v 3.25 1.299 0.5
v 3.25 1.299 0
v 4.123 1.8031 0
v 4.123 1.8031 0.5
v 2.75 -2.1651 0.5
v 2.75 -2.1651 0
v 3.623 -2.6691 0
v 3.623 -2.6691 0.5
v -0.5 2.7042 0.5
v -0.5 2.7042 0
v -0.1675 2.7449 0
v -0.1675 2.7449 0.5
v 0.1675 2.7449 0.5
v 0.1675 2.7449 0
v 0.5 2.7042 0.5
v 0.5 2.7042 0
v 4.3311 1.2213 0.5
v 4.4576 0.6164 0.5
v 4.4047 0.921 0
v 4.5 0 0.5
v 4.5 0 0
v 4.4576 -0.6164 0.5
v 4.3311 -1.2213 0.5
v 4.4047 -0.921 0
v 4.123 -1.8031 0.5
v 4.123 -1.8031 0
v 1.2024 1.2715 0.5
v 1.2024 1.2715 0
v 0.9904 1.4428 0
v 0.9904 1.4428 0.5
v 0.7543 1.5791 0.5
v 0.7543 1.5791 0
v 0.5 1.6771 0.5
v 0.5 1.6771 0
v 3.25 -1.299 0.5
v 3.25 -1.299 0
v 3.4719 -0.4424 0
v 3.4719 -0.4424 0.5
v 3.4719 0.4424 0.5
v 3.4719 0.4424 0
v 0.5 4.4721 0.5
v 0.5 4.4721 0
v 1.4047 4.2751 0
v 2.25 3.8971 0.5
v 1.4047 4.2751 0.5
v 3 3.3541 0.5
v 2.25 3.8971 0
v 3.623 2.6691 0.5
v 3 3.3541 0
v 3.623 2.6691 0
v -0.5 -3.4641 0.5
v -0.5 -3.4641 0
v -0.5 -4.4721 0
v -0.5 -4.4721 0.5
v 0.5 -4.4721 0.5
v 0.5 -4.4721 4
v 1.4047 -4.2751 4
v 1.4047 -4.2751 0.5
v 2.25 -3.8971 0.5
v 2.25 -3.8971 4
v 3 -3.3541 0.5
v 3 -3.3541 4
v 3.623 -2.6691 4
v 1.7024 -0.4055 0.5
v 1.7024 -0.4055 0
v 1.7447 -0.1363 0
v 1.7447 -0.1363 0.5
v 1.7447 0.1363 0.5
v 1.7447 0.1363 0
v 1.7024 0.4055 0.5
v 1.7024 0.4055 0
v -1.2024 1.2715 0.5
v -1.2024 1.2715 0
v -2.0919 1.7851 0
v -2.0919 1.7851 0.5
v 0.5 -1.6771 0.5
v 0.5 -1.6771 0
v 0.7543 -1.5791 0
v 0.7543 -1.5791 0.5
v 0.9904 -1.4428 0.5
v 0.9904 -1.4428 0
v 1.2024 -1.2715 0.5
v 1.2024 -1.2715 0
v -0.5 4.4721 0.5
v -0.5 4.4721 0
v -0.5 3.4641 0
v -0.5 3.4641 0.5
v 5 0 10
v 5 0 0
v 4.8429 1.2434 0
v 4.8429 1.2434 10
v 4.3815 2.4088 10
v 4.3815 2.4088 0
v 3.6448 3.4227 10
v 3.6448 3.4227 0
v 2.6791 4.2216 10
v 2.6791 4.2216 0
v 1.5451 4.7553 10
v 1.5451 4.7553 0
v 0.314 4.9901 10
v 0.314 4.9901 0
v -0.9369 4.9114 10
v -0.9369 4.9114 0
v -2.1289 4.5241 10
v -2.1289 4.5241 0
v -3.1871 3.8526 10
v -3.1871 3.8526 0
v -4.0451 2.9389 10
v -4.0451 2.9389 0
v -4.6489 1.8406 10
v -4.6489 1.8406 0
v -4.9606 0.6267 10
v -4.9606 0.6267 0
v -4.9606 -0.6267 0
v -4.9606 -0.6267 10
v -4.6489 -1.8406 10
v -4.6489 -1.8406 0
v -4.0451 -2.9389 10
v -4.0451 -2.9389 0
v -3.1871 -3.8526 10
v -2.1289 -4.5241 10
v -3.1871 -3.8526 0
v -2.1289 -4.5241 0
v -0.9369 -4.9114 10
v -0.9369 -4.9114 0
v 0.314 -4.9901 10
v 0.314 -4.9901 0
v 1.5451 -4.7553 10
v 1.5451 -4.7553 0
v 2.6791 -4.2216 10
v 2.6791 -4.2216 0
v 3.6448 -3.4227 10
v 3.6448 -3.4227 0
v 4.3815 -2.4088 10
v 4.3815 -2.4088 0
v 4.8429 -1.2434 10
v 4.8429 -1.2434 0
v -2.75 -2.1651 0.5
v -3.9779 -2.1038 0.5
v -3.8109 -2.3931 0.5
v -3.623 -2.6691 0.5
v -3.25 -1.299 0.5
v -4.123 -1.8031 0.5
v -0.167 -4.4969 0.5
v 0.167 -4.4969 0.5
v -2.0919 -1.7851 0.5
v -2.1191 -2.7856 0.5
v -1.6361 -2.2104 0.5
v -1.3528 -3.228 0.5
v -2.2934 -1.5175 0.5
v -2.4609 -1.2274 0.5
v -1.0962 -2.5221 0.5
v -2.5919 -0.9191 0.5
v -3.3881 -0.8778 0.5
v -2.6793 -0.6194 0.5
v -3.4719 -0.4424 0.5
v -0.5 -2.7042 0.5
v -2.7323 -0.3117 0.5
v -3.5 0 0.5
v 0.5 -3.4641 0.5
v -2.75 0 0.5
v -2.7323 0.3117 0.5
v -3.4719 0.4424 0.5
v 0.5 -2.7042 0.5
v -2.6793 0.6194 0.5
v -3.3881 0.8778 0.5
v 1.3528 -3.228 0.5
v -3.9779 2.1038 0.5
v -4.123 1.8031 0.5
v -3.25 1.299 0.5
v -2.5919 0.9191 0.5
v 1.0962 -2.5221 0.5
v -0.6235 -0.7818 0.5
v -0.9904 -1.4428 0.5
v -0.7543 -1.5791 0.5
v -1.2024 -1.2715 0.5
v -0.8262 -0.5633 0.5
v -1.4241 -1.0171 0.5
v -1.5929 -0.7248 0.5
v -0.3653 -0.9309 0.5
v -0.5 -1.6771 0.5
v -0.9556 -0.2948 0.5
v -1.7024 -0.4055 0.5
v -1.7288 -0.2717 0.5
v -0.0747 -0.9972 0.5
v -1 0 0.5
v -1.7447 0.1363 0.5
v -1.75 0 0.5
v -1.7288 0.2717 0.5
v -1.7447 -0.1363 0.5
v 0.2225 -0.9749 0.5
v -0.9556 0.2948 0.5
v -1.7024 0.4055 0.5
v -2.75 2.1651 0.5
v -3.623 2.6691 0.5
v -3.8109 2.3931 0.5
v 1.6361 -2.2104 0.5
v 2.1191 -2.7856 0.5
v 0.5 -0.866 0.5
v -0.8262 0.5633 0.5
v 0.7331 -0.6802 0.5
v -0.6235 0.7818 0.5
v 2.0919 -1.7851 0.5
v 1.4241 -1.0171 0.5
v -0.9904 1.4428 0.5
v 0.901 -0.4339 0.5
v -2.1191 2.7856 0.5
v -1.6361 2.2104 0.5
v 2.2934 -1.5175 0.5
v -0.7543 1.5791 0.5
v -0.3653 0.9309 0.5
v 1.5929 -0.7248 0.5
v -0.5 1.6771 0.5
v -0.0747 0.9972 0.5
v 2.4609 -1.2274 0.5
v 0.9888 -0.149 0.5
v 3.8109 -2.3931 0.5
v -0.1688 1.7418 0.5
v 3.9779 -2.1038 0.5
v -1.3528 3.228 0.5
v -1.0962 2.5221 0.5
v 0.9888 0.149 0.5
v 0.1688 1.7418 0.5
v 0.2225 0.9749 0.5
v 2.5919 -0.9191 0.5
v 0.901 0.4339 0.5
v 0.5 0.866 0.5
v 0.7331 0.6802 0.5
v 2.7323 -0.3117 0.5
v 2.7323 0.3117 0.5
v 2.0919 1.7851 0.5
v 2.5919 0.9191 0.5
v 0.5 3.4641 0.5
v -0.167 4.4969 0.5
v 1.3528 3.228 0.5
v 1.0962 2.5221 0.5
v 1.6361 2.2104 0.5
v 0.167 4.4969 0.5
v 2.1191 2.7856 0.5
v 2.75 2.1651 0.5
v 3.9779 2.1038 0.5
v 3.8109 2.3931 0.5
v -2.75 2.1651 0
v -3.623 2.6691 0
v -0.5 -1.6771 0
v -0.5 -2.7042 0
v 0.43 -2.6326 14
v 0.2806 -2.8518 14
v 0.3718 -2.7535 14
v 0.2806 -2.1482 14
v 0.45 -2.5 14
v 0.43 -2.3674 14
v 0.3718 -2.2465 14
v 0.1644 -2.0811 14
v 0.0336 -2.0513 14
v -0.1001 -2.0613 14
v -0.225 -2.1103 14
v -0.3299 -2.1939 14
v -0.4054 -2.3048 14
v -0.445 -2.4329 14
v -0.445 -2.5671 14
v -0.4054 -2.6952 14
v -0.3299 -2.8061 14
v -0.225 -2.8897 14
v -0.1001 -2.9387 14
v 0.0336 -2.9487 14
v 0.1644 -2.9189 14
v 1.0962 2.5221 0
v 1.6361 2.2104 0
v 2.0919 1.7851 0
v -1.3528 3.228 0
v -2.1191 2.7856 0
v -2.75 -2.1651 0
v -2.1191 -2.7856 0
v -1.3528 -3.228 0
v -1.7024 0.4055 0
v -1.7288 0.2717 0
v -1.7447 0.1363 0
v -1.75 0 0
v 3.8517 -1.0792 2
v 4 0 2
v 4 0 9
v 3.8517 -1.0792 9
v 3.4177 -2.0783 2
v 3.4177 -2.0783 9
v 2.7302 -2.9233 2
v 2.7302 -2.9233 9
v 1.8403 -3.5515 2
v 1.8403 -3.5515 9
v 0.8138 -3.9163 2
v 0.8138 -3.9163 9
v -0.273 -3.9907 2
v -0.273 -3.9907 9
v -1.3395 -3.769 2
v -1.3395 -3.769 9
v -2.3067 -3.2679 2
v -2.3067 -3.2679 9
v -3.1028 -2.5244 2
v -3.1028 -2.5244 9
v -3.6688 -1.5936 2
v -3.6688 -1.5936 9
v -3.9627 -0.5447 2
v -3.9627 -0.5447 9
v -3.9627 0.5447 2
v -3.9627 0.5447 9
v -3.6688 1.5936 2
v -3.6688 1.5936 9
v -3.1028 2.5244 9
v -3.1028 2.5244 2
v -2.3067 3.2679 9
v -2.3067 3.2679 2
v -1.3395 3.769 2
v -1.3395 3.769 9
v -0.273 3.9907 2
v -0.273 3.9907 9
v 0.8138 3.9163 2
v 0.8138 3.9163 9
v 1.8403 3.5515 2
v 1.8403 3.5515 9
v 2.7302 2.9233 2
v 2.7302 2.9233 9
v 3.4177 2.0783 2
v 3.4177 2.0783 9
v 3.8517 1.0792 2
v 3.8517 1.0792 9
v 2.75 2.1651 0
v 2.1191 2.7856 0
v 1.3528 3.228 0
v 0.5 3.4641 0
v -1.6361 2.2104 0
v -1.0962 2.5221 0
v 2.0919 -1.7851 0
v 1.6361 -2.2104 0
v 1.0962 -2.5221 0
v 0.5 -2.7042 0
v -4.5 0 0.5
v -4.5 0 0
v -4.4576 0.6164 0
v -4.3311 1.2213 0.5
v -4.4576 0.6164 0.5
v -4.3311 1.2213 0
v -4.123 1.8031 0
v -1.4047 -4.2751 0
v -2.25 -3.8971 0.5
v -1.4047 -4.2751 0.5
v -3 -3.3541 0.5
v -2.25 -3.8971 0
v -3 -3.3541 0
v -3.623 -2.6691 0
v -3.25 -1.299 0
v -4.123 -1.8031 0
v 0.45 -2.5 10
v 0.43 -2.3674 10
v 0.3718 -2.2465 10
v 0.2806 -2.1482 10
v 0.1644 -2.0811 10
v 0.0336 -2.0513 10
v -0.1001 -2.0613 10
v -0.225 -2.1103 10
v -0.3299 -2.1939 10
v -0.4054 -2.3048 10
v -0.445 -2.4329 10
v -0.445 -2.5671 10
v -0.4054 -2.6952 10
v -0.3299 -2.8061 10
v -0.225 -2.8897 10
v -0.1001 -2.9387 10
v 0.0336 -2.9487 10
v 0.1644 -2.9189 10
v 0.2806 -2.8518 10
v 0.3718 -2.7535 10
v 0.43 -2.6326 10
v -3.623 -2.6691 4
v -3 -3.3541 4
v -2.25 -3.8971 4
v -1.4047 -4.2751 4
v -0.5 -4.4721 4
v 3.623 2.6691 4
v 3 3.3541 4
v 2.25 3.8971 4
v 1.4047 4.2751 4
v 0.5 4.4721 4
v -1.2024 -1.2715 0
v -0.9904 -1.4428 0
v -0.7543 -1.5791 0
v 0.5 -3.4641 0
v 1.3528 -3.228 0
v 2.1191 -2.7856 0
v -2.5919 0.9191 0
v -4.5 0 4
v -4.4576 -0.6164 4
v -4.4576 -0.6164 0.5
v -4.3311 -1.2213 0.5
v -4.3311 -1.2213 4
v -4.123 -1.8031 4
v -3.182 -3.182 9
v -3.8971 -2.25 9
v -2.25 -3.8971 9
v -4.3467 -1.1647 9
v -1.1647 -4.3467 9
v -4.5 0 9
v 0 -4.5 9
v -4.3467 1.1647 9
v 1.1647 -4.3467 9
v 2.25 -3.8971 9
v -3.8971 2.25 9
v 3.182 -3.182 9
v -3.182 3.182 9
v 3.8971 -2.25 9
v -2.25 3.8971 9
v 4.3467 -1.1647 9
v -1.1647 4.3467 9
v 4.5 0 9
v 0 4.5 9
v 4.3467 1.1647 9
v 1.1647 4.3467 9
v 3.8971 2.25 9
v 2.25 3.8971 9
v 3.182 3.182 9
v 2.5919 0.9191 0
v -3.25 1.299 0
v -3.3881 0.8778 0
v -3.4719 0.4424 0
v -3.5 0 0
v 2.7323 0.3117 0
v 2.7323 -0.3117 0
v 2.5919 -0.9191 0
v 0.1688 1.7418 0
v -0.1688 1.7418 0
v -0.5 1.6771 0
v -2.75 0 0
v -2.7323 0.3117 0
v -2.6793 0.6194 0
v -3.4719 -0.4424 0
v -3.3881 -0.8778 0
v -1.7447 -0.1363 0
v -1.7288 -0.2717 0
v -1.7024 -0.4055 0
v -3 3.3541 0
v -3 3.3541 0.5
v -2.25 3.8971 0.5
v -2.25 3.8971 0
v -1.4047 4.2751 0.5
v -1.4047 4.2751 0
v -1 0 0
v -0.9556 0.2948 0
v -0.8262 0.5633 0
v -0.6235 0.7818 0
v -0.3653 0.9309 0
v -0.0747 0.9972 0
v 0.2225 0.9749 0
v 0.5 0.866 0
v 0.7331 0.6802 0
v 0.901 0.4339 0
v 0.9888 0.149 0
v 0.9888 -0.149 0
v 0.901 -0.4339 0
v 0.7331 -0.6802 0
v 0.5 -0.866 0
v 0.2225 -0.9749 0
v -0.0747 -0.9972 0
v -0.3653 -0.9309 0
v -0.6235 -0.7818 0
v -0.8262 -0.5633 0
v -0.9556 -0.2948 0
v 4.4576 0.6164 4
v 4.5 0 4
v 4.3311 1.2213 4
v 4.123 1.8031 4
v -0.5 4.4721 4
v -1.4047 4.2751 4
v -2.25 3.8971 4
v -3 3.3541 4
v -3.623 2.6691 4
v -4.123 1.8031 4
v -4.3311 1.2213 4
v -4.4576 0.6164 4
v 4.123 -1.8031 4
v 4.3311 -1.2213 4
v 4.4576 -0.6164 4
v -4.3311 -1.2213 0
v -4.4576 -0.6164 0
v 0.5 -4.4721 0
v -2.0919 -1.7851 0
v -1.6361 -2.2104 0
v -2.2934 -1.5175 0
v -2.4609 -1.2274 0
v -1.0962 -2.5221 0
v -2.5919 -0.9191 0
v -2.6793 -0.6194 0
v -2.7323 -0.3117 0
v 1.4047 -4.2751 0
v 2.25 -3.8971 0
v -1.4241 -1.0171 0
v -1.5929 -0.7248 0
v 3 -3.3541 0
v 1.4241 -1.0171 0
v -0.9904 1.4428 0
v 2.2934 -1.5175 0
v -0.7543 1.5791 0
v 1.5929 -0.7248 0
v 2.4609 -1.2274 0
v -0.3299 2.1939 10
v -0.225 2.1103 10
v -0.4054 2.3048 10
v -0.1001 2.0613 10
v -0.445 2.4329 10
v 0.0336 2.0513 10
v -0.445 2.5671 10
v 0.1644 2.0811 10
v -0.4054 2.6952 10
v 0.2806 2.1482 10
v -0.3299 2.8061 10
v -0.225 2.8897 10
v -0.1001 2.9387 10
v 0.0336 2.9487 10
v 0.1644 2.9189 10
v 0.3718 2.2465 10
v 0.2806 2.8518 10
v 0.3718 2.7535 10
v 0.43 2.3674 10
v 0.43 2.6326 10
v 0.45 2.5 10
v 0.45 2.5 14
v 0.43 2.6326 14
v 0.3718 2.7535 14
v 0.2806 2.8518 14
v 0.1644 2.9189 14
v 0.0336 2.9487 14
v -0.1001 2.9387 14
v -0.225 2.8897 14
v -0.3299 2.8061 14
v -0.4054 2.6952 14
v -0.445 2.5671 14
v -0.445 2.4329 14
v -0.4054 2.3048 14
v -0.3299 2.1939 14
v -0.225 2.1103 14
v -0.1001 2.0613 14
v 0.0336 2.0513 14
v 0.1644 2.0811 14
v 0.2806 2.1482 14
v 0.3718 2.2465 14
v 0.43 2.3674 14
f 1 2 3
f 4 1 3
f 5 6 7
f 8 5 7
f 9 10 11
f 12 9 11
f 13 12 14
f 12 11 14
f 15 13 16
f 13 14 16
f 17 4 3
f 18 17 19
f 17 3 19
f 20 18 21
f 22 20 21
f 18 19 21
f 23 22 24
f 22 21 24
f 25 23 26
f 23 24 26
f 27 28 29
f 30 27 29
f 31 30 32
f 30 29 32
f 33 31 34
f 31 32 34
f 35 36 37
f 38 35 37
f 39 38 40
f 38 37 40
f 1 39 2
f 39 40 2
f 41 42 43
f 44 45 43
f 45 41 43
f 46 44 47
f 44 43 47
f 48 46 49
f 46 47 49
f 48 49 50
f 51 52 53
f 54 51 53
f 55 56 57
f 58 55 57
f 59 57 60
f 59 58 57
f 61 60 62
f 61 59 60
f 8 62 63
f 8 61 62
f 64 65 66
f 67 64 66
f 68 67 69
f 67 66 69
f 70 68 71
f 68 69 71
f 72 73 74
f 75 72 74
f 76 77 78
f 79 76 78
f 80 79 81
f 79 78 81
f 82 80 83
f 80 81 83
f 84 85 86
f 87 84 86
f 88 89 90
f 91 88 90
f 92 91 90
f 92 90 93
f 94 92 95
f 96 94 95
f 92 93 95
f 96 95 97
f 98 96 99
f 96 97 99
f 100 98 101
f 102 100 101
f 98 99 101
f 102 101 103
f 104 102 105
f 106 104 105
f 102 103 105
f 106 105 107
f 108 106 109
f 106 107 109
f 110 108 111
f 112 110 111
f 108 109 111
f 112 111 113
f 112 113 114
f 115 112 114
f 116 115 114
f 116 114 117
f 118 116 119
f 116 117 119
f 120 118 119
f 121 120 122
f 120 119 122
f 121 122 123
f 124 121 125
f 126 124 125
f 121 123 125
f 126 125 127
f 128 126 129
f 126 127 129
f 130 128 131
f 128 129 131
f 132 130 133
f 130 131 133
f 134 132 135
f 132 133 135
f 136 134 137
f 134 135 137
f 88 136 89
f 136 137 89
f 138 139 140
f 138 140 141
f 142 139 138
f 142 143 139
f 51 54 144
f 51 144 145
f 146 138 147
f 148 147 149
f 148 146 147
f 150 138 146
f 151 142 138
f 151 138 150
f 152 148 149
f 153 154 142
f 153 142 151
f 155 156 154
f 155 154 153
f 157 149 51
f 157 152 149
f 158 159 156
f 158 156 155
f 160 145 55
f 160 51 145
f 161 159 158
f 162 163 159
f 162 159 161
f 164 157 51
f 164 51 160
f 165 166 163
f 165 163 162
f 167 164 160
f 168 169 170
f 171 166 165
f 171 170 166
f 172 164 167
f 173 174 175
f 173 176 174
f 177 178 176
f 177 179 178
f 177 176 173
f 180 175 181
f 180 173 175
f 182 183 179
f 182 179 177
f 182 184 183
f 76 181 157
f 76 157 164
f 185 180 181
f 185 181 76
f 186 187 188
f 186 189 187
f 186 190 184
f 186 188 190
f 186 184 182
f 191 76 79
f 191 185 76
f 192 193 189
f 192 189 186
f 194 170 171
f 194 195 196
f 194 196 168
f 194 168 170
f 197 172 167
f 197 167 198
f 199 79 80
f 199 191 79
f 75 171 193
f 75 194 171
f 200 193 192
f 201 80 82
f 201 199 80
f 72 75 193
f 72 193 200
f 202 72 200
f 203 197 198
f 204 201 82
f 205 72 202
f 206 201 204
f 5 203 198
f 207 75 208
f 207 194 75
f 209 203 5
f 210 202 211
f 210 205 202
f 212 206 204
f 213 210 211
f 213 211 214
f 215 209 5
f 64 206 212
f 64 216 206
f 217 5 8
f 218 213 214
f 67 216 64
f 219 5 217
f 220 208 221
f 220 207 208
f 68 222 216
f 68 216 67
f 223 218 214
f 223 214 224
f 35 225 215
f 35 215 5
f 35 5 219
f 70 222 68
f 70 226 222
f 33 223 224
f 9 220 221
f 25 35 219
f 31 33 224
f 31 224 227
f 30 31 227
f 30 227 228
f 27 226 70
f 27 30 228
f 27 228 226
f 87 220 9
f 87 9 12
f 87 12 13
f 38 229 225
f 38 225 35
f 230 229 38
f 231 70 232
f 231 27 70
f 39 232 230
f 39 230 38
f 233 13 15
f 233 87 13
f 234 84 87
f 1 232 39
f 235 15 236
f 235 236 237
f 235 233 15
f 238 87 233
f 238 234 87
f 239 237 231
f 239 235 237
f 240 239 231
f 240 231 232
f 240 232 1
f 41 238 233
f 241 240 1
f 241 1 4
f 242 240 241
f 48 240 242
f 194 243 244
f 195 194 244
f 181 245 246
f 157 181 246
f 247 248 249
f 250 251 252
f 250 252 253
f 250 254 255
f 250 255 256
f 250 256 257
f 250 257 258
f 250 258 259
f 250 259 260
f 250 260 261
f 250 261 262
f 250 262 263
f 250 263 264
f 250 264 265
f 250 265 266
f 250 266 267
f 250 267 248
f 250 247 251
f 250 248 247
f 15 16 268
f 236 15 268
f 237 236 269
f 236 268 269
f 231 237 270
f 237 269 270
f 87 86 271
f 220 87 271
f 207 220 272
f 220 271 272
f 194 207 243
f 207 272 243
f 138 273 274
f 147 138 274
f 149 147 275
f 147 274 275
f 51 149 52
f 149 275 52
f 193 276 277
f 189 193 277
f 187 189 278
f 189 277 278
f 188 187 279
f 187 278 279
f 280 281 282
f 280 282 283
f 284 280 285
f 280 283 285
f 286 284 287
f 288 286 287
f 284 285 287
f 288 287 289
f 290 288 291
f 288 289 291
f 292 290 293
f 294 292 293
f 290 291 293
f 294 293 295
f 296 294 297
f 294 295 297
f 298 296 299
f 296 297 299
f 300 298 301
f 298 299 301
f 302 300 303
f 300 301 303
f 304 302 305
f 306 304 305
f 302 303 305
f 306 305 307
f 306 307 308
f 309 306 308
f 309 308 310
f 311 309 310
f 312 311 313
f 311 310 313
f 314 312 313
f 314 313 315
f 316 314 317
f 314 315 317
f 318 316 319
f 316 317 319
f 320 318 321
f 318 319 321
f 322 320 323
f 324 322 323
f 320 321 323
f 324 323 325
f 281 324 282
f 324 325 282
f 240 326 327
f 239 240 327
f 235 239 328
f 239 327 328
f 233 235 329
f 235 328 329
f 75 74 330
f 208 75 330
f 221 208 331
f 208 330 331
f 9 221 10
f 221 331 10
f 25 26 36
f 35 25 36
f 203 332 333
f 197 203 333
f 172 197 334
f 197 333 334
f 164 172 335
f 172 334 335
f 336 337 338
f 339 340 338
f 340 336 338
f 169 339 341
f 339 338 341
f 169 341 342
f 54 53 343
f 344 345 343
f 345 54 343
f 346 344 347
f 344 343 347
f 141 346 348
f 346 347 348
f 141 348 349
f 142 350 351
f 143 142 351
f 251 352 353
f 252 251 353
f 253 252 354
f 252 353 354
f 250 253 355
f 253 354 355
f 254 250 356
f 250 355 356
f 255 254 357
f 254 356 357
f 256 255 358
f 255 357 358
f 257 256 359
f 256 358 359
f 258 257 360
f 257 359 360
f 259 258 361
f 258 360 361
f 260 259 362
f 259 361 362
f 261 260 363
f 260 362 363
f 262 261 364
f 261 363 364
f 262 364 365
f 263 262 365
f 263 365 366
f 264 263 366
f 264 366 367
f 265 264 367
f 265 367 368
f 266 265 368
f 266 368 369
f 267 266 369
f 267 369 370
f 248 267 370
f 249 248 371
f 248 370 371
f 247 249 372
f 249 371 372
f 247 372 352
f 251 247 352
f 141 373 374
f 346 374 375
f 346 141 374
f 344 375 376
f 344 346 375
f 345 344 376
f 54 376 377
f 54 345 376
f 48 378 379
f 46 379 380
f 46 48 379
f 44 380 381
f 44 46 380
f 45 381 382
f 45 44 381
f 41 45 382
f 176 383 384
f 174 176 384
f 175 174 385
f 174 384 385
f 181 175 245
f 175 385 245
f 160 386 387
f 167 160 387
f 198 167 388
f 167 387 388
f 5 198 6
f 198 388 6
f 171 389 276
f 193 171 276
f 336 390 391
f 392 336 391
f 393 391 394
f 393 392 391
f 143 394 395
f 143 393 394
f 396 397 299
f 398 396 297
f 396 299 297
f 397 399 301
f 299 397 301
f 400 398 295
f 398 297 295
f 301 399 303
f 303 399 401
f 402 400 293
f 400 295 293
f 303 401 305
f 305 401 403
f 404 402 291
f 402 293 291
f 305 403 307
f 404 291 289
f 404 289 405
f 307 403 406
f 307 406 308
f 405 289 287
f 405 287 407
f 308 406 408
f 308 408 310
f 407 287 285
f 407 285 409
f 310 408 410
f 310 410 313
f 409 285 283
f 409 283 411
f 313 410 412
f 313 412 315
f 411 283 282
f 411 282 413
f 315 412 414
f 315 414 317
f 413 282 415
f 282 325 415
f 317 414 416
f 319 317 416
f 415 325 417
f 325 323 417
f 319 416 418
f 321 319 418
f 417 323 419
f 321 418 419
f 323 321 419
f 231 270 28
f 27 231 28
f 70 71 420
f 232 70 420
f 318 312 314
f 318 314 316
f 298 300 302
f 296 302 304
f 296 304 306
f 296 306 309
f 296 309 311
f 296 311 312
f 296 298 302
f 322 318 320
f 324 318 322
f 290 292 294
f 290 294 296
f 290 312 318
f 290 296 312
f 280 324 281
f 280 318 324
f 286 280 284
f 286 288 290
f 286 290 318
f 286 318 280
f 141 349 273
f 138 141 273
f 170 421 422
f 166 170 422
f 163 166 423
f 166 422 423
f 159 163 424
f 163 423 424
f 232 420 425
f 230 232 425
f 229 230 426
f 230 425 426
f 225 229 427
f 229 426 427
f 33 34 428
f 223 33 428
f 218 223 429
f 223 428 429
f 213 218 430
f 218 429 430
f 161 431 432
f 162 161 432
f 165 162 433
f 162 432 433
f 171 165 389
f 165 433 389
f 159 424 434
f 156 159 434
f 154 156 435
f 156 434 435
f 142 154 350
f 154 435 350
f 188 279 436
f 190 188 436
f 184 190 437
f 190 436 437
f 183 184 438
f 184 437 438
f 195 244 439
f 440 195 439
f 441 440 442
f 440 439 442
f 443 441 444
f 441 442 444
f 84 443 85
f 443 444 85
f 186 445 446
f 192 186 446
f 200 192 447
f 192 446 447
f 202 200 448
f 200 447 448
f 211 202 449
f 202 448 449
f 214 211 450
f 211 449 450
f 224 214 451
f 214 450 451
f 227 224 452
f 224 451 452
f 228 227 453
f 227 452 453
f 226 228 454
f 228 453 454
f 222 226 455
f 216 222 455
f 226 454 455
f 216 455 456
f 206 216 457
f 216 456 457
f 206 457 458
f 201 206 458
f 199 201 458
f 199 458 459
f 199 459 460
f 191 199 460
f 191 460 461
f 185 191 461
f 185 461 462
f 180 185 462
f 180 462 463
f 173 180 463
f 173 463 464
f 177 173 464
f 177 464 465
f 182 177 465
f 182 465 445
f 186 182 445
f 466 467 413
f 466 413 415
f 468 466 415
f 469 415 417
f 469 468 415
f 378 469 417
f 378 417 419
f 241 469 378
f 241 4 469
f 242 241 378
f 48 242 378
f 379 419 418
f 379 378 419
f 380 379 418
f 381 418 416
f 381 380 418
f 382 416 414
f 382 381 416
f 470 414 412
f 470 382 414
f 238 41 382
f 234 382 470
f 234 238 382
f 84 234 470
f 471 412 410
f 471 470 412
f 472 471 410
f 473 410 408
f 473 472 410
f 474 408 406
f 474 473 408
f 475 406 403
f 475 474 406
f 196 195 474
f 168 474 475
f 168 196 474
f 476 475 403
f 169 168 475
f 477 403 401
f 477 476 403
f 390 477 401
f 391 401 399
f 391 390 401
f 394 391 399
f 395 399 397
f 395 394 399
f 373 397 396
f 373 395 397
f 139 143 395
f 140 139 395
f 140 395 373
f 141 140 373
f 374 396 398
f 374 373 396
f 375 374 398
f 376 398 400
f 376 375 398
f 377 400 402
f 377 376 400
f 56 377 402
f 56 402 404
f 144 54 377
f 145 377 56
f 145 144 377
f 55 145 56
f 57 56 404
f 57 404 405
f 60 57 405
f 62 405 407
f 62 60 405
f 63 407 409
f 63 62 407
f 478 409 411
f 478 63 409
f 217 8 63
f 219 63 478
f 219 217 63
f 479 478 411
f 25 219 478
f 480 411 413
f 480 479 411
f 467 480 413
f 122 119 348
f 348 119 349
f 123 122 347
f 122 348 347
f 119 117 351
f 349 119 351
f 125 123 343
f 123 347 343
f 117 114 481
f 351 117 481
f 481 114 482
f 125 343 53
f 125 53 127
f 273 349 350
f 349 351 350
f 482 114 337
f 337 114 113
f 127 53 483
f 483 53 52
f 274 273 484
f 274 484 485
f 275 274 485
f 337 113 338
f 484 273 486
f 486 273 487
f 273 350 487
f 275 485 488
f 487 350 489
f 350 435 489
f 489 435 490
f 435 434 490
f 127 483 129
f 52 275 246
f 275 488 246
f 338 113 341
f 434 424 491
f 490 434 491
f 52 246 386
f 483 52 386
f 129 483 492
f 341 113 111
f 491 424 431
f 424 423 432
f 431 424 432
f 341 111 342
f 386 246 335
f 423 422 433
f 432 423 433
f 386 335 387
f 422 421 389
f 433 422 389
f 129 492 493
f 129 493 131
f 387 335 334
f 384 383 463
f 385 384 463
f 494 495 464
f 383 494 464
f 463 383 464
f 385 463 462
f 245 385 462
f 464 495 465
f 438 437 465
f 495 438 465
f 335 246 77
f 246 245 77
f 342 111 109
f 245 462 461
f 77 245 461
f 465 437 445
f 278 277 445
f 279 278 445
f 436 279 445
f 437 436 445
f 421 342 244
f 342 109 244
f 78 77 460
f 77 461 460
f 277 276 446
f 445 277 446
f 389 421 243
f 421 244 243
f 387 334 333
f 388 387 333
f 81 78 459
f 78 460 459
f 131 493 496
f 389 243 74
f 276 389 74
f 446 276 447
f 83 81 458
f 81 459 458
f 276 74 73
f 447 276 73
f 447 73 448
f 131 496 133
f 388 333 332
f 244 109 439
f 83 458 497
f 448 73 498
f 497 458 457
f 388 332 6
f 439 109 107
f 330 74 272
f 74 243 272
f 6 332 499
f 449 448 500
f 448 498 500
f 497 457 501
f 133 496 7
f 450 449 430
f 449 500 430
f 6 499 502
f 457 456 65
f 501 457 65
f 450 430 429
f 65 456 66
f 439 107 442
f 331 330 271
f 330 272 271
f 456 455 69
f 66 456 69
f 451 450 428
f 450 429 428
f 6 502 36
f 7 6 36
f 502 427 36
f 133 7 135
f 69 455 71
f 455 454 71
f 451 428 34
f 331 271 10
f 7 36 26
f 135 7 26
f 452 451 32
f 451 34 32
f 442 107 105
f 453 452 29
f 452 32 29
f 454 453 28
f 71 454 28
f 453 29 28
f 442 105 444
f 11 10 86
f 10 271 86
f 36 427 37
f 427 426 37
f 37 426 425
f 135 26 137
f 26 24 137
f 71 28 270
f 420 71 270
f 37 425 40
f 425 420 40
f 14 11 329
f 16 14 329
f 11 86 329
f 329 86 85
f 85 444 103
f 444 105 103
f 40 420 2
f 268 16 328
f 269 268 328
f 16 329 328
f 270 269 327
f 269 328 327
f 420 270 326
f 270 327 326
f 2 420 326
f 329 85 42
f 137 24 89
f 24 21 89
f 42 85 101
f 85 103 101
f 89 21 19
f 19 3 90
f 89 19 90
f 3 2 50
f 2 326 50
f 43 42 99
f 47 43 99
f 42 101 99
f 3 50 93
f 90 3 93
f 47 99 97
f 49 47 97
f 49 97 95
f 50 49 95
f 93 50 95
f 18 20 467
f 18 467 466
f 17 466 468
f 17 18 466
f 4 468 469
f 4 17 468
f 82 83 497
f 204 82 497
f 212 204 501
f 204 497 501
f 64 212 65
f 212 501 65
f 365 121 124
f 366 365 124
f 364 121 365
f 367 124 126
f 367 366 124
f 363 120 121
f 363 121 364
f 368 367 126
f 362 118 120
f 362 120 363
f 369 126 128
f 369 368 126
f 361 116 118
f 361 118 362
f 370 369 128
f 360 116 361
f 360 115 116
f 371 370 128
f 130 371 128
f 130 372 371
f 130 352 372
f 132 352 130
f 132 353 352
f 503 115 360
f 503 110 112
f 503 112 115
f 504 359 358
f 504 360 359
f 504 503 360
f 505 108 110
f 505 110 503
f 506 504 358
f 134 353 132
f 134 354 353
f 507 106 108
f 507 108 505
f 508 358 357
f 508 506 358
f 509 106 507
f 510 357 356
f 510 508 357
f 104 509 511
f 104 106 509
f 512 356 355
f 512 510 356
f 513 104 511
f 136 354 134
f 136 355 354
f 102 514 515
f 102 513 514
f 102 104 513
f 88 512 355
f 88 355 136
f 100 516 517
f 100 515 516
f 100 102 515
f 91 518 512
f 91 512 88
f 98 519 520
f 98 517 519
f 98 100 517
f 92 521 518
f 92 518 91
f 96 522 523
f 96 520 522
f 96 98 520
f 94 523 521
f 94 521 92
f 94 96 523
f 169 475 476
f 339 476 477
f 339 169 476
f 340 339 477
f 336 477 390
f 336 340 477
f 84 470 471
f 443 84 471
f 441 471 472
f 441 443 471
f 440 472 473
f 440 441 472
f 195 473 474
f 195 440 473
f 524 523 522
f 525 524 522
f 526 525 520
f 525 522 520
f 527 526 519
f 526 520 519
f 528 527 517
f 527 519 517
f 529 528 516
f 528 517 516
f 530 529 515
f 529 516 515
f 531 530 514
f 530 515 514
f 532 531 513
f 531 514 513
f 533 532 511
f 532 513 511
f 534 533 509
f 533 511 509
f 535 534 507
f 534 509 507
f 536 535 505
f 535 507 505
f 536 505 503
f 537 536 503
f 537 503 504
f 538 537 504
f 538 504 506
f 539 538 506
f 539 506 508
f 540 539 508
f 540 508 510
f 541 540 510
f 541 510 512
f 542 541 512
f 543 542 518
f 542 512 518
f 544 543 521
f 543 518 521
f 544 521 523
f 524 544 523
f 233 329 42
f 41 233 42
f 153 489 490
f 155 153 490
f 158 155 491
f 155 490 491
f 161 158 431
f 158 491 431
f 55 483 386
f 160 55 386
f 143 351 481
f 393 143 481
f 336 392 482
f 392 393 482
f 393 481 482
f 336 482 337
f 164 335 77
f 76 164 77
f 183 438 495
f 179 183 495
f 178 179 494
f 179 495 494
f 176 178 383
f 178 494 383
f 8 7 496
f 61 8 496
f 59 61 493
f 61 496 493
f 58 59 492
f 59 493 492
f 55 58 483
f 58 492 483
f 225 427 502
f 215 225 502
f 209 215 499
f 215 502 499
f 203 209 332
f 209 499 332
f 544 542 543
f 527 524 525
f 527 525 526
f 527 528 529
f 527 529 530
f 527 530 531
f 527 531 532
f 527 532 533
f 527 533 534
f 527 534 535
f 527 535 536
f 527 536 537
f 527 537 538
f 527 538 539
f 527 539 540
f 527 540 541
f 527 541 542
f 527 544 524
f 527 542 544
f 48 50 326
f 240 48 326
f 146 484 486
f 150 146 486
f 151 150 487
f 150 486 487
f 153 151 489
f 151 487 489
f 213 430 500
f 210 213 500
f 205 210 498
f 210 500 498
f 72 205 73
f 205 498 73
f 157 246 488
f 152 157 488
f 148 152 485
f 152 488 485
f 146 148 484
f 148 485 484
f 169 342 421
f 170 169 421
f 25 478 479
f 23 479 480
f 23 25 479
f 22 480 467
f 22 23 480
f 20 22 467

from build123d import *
from build123d.topology import SkipClean

# Parameters (mm, degrees)
SKETCH1_R           = 5
BOSS_EXTRUDE1_DEPTH = 10
SKETCH2_R           = 0.45
BOSS_EXTRUDE2_DEPTH = 4
SHELL1_START        = 0.5
SHELL1_OUTLINE_R    = 4.5
SHELL1_DEPTH        = 8.5
SKETCH4_R           = 1
CUT_EXTRUDE2_DEPTH  = 4
SKETCH5_R           = 4
BOSS_EXTRUDE3_DEPTH = 7


# Read off the part's stored shape, not the designer's step: Shell1
with BuildPart() as part:
    # Sketch1 → Boss-Extrude1 (new body)
    with BuildSketch(Plane.XY):
        Circle(SKETCH1_R)
    extrude(amount=BOSS_EXTRUDE1_DEPTH)

    # Sketch2 → Boss-Extrude2 (add)
    with BuildSketch(Plane.XY.offset(10)):
        with Locations((0, 2.5)):
            Circle(SKETCH2_R)
        with Locations((0, -2.5)):
            Circle(SKETCH2_R)
    extrude(amount=BOSS_EXTRUDE2_DEPTH)

    # Shell1 outline → Shell1 (cut)
    with BuildSketch(Plane.XY.offset(SHELL1_START)):
        Circle(SHELL1_OUTLINE_R)
    extrude(amount=SHELL1_DEPTH, mode=Mode.SUBTRACT)

    # Sketch4 → Cut-Extrude2 (cut)
    with SkipClean():  # the faces are left unmerged after this step: merging them gives an invalid solid
        with BuildSketch(Plane(origin=(0, 0, 0), x_dir=(-1, 0, 0), z_dir=(0, 0, -1))):
            with BuildLine():
                ThreePointArc((-2.75, 2.165063509), (-1.75, 3.031088913), (-0.5, 3.464101615))
                Line((-0.5, 3.464101615), (-0.5, 4.472135955))
                ThreePointArc((-0.5, 4.472135955), (-2.25, 3.897114317), (-3.622983346, 2.669080679))
                Line((-3.622983346, 2.669080679), (-2.75, 2.165063509))
            make_face()
            with BuildLine():
                ThreePointArc((0.5, 3.464101615), (1.75, 3.031088913), (2.75, 2.165063509))
                Line((2.75, 2.165063509), (3.622983346, 2.669080679))
                ThreePointArc((3.622983346, 2.669080679), (2.25, 3.897114317), (0.5, 4.472135955))
                Line((0.5, 4.472135955), (0.5, 3.464101615))
            make_face()
            with BuildLine():
                ThreePointArc((0.5, 1.677050983), (0.875, 1.515544457), (1.202368755, 1.271538193))
                Line((1.202368755, 1.271538193), (2.091874249, 1.78509443))
                ThreePointArc((2.091874249, 1.78509443), (1.375, 2.38156986), (0.5, 2.704163457))
                Line((0.5, 2.704163457), (0.5, 1.677050983))
            make_face()
            with BuildLine():
                ThreePointArc((-1.202368755, 1.271538193), (-0.875, 1.515544457), (-0.5, 1.677050983))
                Line((-0.5, 1.677050983), (-0.5, 2.704163457))
                ThreePointArc((-0.5, 2.704163457), (-1.375, 2.38156986), (-2.091874249, 1.78509443))
                Line((-2.091874249, 1.78509443), (-1.202368755, 1.271538193))
            make_face()
            Circle(SKETCH4_R)
            with BuildLine():
                ThreePointArc((-1.702368755, -0.40551279), (-1.75, 0), (-1.702368755, 0.40551279))
                Line((-1.702368755, 0.40551279), (-2.591874249, 0.919069026))
                ThreePointArc((-2.591874249, 0.919069026), (-2.75, 0), (-2.591874249, -0.919069026))
                Line((-2.591874249, -0.919069026), (-1.702368755, -0.40551279))
            make_face()
            with BuildLine():
                Line((-0.5, -2.704163457), (-0.5, -1.677050983))
                ThreePointArc((-0.5, -1.677050983), (-0.875, -1.515544457), (-1.202368755, -1.271538193))
                Line((-1.202368755, -1.271538193), (-2.091874249, -1.78509443))
                ThreePointArc((-2.091874249, -1.78509443), (-1.375, -2.38156986), (-0.5, -2.704163457))
            make_face()
            with BuildLine():
                Line((2.091874249, -1.78509443), (1.202368755, -1.271538193))
                ThreePointArc((1.202368755, -1.271538193), (0.875, -1.515544457), (0.5, -1.677050983))
                Line((0.5, -1.677050983), (0.5, -2.704163457))
                ThreePointArc((0.5, -2.704163457), (1.375, -2.38156986), (2.091874249, -1.78509443))
            make_face()
            with BuildLine():
                Line((2.591874249, 0.919069026), (1.702368755, 0.40551279))
                ThreePointArc((1.702368755, 0.40551279), (1.738051398, 0.204150287), (1.75, 0))
                ThreePointArc((1.75, 0), (1.738051398, -0.204150287), (1.702368755, -0.40551279))
                Line((1.702368755, -0.40551279), (2.591874249, -0.919069026))
                ThreePointArc((2.591874249, -0.919069026), (2.710180269, -0.466286293), (2.75, 0))
                ThreePointArc((2.75, 0), (2.710180269, 0.466286293), (2.591874249, 0.919069026))
            make_face()
            with BuildLine():
                Line((2.591874249, -0.919069026), (1.702368755, -0.40551279))
                ThreePointArc((1.702368755, -0.40551279), (1.515544457, -0.875), (1.202368755, -1.271538193))
                Line((1.202368755, -1.271538193), (2.091874249, -1.78509443))
                ThreePointArc((2.091874249, -1.78509443), (2.38156986, -1.375), (2.591874249, -0.919069026))
            make_face()
            with BuildLine():
                ThreePointArc((-1.202368755, -1.271538193), (-1.515544457, -0.875), (-1.702368755, -0.40551279))
                Line((-1.702368755, -0.40551279), (-2.591874249, -0.919069026))
                ThreePointArc((-2.591874249, -0.919069026), (-2.38156986, -1.375), (-2.091874249, -1.78509443))
                Line((-2.091874249, -1.78509443), (-1.202368755, -1.271538193))
            make_face()
            with BuildLine():
                ThreePointArc((-0.5, 1.677050983), (0, 1.75), (0.5, 1.677050983))
                Line((0.5, 1.677050983), (0.5, 2.704163457))
                ThreePointArc((0.5, 2.704163457), (0, 2.75), (-0.5, 2.704163457))
                Line((-0.5, 2.704163457), (-0.5, 1.677050983))
            make_face()
            with BuildLine():
                Line((4.122983346, 1.803055276), (3.25, 1.299038106))
                ThreePointArc((3.25, 1.299038106), (3.436931771, 0.661437828), (3.5, 0))
                ThreePointArc((3.5, 0), (3.436931771, -0.661437828), (3.25, -1.299038106))
                Line((3.25, -1.299038106), (4.122983346, -1.803055276))
                ThreePointArc((4.122983346, -1.803055276), (4.40473751, -0.921025228), (4.5, 0))
                ThreePointArc((4.5, 0), (4.40473751, 0.921025228), (4.122983346, 1.803055276))
            make_face()
            with BuildLine():
                Line((3.622983346, -2.669080679), (2.75, -2.165063509))
                ThreePointArc((2.75, -2.165063509), (1.75, -3.031088913), (0.5, -3.464101615))
                Line((0.5, -3.464101615), (0.5, -4.472135955))
                ThreePointArc((0.5, -4.472135955), (2.25, -3.897114317), (3.622983346, -2.669080679))
            make_face()
            with BuildLine():
                Line((-0.5, -4.472135955), (-0.5, -3.464101615))
                ThreePointArc((-0.5, -3.464101615), (-1.75, -3.031088913), (-2.75, -2.165063509))
                Line((-2.75, -2.165063509), (-3.622983346, -2.669080679))
                ThreePointArc((-3.622983346, -2.669080679), (-2.25, -3.897114317), (-0.5, -4.472135955))
            make_face()
            with BuildLine():
                ThreePointArc((-3.25, -1.299038106), (-3.5, 0), (-3.25, 1.299038106))
                Line((-3.25, 1.299038106), (-4.122983346, 1.803055276))
                ThreePointArc((-4.122983346, 1.803055276), (-4.5, 0), (-4.122983346, -1.803055276))
                Line((-4.122983346, -1.803055276), (-3.25, -1.299038106))
            make_face()
        extrude(amount=-CUT_EXTRUDE2_DEPTH, mode=Mode.SUBTRACT)

    # Sketch5 → Boss-Extrude3 (add)
    with SkipClean():  # the faces are left unmerged after this step: merging them gives an invalid solid
        with BuildSketch(Plane(origin=(0, 0, 9), x_dir=(-1, 0, 0), z_dir=(0, 0, -1))):
            with Locations(Location((0, 0, 0), (0, 0, 180))):
                Circle(SKETCH5_R)
        extrude(amount=BOSS_EXTRUDE3_DEPTH)


solid = part.part
